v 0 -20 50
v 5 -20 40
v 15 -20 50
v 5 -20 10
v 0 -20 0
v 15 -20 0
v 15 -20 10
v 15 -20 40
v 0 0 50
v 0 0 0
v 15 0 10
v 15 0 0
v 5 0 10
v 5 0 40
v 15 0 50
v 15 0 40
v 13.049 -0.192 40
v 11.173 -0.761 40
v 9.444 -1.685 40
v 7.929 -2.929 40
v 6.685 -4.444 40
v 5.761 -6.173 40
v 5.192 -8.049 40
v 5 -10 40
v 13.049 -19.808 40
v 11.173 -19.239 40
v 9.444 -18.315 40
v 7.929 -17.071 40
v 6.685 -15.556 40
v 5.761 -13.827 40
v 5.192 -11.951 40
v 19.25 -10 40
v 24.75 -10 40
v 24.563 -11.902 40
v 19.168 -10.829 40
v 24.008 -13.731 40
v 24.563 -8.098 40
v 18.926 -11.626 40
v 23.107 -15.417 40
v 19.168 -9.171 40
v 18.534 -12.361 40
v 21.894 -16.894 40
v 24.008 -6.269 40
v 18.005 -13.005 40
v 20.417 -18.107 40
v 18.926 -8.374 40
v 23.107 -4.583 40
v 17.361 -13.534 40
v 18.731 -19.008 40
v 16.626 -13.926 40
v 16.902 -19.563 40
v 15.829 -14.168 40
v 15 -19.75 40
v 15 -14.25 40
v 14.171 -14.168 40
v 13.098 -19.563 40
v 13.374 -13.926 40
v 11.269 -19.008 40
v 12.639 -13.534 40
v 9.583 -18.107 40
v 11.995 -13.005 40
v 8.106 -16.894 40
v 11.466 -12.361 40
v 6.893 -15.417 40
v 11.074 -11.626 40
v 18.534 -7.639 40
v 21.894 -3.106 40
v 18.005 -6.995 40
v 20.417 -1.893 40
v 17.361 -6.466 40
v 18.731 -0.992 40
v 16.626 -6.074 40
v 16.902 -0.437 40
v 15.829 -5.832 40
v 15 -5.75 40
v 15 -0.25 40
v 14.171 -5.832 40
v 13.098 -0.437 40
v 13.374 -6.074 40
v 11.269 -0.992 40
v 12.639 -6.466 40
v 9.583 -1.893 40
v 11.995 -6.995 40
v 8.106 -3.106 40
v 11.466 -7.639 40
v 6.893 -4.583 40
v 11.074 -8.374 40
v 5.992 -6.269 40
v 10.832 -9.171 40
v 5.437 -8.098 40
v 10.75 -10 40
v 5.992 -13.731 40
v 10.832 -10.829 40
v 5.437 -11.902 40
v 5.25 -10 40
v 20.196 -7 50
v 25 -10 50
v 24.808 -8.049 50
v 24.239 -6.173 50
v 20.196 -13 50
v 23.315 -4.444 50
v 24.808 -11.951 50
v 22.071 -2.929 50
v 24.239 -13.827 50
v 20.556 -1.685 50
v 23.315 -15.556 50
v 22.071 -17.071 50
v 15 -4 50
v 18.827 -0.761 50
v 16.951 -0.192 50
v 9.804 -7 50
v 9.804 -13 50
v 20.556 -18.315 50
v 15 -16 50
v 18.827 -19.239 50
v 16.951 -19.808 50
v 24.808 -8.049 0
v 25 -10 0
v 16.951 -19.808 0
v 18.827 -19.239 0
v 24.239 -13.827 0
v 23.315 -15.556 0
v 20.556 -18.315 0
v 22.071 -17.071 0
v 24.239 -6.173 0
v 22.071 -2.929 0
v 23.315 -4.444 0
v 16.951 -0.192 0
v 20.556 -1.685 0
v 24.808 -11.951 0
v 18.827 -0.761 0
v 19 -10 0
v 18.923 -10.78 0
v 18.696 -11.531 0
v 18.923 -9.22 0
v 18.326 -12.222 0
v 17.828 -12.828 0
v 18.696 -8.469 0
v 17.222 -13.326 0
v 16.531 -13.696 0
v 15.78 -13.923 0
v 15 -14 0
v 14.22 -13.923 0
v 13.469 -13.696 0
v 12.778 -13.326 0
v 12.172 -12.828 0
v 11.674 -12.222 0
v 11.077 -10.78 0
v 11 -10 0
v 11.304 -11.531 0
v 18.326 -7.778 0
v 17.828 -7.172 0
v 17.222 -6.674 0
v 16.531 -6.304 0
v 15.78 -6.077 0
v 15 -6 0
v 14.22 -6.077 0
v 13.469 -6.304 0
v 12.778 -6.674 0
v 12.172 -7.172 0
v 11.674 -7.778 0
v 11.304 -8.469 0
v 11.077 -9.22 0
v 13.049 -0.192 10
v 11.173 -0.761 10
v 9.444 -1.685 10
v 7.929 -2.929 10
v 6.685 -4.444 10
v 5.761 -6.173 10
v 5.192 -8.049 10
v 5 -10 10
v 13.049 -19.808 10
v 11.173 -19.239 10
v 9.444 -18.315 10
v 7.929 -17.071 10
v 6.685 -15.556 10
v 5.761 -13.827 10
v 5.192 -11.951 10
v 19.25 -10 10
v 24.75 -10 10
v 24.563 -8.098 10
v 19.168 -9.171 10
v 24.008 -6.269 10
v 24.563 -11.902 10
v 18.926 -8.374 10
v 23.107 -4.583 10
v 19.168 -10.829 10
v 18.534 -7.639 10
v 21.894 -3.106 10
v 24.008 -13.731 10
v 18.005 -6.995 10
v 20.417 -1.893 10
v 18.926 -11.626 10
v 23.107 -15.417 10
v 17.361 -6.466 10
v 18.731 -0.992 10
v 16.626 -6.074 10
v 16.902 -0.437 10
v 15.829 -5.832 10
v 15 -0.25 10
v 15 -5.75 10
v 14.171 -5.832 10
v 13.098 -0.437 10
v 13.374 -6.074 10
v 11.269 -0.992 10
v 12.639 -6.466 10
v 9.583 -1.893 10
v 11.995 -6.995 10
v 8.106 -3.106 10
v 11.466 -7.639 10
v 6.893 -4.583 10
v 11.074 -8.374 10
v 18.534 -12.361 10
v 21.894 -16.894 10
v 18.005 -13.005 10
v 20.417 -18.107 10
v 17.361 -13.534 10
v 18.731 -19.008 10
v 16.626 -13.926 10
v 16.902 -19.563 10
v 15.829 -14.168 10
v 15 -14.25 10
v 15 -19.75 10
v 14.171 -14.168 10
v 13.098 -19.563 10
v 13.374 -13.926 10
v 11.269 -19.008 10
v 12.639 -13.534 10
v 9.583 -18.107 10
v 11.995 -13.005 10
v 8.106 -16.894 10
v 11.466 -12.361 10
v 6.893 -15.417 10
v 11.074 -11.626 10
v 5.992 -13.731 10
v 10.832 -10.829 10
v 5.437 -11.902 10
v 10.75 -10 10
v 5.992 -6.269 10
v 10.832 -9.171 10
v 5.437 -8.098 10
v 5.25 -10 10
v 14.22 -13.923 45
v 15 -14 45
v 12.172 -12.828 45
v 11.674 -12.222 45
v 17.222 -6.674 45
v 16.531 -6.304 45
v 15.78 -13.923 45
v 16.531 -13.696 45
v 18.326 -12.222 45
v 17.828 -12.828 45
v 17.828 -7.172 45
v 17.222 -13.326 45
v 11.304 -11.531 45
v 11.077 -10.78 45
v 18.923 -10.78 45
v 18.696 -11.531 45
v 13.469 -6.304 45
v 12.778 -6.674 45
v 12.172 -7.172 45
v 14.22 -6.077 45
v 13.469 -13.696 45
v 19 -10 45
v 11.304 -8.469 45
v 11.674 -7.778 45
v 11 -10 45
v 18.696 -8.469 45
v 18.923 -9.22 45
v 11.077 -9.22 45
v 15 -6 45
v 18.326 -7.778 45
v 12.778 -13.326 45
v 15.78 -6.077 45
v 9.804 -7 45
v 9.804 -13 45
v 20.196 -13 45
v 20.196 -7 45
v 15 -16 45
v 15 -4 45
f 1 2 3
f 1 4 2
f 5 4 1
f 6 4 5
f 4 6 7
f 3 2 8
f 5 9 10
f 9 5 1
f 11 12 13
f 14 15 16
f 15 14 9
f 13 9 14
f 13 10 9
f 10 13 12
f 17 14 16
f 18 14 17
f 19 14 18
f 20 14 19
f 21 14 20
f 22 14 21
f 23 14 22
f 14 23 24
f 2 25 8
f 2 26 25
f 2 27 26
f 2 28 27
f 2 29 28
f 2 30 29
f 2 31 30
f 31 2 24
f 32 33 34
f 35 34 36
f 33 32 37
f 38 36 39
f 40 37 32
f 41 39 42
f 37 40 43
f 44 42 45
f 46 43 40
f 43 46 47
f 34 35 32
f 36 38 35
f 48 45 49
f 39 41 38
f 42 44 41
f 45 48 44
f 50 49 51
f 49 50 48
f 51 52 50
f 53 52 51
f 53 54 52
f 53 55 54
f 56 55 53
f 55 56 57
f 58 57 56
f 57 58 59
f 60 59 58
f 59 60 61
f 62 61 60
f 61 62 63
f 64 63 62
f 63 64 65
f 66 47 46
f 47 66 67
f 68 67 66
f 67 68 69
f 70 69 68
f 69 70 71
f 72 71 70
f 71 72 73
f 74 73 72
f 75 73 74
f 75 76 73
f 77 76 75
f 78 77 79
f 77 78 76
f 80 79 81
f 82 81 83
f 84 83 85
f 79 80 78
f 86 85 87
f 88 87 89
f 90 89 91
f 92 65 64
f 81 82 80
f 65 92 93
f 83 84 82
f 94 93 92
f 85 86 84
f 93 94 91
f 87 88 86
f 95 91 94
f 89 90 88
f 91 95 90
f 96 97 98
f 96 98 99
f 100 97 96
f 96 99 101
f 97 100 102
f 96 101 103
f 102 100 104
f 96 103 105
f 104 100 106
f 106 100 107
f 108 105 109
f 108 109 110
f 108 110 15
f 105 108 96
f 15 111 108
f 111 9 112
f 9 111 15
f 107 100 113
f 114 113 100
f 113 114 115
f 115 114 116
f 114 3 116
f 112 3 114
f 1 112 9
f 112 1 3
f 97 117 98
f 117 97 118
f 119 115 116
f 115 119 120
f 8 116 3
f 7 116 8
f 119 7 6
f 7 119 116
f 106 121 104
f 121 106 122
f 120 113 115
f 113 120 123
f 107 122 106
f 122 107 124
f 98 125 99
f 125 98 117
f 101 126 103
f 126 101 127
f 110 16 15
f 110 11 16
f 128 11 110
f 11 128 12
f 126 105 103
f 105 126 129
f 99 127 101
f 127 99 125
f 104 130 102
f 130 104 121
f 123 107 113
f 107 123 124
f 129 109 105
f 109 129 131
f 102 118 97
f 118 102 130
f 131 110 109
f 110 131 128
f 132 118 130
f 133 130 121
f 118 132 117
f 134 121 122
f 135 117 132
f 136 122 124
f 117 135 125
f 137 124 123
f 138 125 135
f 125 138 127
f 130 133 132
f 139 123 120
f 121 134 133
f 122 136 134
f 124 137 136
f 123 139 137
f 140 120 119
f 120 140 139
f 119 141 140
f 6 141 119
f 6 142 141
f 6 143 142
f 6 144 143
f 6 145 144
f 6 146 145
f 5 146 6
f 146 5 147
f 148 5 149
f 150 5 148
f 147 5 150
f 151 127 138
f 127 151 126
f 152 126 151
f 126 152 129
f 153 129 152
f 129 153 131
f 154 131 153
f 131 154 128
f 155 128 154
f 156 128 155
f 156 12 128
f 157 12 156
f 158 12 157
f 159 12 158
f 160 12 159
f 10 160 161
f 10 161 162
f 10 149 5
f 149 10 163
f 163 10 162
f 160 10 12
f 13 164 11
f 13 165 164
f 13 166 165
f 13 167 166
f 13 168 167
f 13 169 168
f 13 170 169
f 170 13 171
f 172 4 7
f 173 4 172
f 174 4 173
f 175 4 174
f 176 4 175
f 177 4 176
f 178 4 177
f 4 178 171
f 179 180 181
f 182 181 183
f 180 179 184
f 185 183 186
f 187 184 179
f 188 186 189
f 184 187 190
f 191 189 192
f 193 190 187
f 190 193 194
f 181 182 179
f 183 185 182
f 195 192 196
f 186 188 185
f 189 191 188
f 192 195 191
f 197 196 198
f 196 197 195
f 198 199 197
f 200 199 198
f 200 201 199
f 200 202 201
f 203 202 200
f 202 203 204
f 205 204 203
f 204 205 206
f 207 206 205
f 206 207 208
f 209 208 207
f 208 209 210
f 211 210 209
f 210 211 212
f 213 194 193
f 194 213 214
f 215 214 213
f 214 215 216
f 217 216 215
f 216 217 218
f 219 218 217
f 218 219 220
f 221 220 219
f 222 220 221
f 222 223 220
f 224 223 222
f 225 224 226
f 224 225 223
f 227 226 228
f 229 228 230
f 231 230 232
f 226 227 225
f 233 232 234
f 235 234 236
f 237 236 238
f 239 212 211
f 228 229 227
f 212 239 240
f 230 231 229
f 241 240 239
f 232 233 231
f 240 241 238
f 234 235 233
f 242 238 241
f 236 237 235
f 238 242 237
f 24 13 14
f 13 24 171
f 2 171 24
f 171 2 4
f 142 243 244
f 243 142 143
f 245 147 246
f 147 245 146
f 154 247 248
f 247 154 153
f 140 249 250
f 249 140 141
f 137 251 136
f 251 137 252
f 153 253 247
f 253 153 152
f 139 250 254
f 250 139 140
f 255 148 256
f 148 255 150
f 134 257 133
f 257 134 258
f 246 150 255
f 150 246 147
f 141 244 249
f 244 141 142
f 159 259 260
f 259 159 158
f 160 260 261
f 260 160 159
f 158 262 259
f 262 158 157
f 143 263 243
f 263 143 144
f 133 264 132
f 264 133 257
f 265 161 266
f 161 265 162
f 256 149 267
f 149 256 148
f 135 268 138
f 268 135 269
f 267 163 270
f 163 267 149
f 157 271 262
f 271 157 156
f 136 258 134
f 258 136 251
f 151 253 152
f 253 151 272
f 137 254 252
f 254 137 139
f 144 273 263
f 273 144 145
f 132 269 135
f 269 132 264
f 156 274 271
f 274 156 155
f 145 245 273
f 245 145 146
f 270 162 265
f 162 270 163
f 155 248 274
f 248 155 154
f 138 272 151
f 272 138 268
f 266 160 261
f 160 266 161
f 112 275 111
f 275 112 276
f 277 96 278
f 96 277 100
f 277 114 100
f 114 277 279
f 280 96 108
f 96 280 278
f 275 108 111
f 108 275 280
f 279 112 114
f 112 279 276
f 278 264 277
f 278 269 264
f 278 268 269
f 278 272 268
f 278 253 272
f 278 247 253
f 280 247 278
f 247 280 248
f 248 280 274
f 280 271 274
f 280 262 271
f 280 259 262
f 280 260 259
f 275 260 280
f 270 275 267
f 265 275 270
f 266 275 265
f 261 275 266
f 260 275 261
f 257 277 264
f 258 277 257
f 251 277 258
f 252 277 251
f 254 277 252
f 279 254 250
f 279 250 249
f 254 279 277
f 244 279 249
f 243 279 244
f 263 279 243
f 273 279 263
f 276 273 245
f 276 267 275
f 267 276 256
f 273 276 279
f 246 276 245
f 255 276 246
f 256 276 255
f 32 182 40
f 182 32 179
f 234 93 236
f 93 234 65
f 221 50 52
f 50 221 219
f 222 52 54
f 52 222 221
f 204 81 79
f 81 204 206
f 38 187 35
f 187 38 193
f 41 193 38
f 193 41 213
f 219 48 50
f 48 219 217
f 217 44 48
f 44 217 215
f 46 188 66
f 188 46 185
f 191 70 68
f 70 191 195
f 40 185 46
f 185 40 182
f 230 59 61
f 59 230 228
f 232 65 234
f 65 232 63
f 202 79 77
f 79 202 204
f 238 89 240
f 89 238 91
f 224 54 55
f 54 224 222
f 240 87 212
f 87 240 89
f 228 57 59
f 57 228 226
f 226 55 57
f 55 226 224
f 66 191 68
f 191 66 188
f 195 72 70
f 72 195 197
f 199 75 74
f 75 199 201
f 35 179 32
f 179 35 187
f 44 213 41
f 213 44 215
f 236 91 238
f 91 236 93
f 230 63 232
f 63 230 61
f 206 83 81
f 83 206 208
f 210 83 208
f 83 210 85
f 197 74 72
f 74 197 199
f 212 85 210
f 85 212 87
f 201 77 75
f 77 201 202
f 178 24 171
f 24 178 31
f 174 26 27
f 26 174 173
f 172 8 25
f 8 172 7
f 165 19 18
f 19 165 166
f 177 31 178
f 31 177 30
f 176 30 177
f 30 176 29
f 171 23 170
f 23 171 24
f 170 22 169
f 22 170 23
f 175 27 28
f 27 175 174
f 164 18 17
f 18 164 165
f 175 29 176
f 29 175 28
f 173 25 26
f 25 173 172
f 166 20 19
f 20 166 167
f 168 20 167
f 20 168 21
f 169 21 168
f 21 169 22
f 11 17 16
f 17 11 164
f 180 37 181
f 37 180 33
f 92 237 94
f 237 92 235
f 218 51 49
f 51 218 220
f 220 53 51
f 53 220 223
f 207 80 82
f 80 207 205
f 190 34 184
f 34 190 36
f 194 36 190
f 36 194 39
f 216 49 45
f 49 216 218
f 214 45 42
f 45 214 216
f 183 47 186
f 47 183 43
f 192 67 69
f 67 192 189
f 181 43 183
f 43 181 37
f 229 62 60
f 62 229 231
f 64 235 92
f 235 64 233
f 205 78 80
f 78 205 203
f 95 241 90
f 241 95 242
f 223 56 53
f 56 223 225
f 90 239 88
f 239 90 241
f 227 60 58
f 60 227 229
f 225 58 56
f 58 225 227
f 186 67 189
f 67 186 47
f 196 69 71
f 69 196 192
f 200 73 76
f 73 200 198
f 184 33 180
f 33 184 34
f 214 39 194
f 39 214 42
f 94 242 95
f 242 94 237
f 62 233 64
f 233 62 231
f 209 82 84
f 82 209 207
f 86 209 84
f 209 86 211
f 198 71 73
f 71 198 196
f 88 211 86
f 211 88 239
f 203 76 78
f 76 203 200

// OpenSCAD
translate([0,0,50]) rotate([270,0,-90]) union() {
  difference() {
    union() {
      // base
      cube([20,50,5]);
      // left ear
      union() {
        cube([20,10,15]);
        translate([10,10,15]) rotate([90,0,0]) cylinder(10,10,10,$fn=32);
      }
      // right ear
      translate([0,40,0]) union() {
        cube([20,10,15]);
        translate([10,10,15]) rotate([90,0,0]) cylinder(10,10,10,$fn=32);    
      }
    }
    // hole for rod
    translate([10,55,15]) rotate([90,0,0]) cylinder(60,4,4,$fn=32);
    // nut trap
    translate([10,5,15]) rotate([90,0,0]) cylinder(10,6,6,$fn=6);
  }
  // add support
  // inner
  difference() {
    translate([10,40,15]) rotate([90,0,0]) cylinder(30,4.25,4.25,$fn=32);
    translate([10,40,15]) rotate([90,0,0]) cylinder(30,4,4,$fn=32);
  }
  // outer
  difference() {
    translate([10,40,15]) rotate([90,0,0]) cylinder(30,10,10,$fn=32);
    translate([10,40,15]) rotate([90,0,0]) cylinder(30,9.75,9.75,$fn=32);
  }
}
